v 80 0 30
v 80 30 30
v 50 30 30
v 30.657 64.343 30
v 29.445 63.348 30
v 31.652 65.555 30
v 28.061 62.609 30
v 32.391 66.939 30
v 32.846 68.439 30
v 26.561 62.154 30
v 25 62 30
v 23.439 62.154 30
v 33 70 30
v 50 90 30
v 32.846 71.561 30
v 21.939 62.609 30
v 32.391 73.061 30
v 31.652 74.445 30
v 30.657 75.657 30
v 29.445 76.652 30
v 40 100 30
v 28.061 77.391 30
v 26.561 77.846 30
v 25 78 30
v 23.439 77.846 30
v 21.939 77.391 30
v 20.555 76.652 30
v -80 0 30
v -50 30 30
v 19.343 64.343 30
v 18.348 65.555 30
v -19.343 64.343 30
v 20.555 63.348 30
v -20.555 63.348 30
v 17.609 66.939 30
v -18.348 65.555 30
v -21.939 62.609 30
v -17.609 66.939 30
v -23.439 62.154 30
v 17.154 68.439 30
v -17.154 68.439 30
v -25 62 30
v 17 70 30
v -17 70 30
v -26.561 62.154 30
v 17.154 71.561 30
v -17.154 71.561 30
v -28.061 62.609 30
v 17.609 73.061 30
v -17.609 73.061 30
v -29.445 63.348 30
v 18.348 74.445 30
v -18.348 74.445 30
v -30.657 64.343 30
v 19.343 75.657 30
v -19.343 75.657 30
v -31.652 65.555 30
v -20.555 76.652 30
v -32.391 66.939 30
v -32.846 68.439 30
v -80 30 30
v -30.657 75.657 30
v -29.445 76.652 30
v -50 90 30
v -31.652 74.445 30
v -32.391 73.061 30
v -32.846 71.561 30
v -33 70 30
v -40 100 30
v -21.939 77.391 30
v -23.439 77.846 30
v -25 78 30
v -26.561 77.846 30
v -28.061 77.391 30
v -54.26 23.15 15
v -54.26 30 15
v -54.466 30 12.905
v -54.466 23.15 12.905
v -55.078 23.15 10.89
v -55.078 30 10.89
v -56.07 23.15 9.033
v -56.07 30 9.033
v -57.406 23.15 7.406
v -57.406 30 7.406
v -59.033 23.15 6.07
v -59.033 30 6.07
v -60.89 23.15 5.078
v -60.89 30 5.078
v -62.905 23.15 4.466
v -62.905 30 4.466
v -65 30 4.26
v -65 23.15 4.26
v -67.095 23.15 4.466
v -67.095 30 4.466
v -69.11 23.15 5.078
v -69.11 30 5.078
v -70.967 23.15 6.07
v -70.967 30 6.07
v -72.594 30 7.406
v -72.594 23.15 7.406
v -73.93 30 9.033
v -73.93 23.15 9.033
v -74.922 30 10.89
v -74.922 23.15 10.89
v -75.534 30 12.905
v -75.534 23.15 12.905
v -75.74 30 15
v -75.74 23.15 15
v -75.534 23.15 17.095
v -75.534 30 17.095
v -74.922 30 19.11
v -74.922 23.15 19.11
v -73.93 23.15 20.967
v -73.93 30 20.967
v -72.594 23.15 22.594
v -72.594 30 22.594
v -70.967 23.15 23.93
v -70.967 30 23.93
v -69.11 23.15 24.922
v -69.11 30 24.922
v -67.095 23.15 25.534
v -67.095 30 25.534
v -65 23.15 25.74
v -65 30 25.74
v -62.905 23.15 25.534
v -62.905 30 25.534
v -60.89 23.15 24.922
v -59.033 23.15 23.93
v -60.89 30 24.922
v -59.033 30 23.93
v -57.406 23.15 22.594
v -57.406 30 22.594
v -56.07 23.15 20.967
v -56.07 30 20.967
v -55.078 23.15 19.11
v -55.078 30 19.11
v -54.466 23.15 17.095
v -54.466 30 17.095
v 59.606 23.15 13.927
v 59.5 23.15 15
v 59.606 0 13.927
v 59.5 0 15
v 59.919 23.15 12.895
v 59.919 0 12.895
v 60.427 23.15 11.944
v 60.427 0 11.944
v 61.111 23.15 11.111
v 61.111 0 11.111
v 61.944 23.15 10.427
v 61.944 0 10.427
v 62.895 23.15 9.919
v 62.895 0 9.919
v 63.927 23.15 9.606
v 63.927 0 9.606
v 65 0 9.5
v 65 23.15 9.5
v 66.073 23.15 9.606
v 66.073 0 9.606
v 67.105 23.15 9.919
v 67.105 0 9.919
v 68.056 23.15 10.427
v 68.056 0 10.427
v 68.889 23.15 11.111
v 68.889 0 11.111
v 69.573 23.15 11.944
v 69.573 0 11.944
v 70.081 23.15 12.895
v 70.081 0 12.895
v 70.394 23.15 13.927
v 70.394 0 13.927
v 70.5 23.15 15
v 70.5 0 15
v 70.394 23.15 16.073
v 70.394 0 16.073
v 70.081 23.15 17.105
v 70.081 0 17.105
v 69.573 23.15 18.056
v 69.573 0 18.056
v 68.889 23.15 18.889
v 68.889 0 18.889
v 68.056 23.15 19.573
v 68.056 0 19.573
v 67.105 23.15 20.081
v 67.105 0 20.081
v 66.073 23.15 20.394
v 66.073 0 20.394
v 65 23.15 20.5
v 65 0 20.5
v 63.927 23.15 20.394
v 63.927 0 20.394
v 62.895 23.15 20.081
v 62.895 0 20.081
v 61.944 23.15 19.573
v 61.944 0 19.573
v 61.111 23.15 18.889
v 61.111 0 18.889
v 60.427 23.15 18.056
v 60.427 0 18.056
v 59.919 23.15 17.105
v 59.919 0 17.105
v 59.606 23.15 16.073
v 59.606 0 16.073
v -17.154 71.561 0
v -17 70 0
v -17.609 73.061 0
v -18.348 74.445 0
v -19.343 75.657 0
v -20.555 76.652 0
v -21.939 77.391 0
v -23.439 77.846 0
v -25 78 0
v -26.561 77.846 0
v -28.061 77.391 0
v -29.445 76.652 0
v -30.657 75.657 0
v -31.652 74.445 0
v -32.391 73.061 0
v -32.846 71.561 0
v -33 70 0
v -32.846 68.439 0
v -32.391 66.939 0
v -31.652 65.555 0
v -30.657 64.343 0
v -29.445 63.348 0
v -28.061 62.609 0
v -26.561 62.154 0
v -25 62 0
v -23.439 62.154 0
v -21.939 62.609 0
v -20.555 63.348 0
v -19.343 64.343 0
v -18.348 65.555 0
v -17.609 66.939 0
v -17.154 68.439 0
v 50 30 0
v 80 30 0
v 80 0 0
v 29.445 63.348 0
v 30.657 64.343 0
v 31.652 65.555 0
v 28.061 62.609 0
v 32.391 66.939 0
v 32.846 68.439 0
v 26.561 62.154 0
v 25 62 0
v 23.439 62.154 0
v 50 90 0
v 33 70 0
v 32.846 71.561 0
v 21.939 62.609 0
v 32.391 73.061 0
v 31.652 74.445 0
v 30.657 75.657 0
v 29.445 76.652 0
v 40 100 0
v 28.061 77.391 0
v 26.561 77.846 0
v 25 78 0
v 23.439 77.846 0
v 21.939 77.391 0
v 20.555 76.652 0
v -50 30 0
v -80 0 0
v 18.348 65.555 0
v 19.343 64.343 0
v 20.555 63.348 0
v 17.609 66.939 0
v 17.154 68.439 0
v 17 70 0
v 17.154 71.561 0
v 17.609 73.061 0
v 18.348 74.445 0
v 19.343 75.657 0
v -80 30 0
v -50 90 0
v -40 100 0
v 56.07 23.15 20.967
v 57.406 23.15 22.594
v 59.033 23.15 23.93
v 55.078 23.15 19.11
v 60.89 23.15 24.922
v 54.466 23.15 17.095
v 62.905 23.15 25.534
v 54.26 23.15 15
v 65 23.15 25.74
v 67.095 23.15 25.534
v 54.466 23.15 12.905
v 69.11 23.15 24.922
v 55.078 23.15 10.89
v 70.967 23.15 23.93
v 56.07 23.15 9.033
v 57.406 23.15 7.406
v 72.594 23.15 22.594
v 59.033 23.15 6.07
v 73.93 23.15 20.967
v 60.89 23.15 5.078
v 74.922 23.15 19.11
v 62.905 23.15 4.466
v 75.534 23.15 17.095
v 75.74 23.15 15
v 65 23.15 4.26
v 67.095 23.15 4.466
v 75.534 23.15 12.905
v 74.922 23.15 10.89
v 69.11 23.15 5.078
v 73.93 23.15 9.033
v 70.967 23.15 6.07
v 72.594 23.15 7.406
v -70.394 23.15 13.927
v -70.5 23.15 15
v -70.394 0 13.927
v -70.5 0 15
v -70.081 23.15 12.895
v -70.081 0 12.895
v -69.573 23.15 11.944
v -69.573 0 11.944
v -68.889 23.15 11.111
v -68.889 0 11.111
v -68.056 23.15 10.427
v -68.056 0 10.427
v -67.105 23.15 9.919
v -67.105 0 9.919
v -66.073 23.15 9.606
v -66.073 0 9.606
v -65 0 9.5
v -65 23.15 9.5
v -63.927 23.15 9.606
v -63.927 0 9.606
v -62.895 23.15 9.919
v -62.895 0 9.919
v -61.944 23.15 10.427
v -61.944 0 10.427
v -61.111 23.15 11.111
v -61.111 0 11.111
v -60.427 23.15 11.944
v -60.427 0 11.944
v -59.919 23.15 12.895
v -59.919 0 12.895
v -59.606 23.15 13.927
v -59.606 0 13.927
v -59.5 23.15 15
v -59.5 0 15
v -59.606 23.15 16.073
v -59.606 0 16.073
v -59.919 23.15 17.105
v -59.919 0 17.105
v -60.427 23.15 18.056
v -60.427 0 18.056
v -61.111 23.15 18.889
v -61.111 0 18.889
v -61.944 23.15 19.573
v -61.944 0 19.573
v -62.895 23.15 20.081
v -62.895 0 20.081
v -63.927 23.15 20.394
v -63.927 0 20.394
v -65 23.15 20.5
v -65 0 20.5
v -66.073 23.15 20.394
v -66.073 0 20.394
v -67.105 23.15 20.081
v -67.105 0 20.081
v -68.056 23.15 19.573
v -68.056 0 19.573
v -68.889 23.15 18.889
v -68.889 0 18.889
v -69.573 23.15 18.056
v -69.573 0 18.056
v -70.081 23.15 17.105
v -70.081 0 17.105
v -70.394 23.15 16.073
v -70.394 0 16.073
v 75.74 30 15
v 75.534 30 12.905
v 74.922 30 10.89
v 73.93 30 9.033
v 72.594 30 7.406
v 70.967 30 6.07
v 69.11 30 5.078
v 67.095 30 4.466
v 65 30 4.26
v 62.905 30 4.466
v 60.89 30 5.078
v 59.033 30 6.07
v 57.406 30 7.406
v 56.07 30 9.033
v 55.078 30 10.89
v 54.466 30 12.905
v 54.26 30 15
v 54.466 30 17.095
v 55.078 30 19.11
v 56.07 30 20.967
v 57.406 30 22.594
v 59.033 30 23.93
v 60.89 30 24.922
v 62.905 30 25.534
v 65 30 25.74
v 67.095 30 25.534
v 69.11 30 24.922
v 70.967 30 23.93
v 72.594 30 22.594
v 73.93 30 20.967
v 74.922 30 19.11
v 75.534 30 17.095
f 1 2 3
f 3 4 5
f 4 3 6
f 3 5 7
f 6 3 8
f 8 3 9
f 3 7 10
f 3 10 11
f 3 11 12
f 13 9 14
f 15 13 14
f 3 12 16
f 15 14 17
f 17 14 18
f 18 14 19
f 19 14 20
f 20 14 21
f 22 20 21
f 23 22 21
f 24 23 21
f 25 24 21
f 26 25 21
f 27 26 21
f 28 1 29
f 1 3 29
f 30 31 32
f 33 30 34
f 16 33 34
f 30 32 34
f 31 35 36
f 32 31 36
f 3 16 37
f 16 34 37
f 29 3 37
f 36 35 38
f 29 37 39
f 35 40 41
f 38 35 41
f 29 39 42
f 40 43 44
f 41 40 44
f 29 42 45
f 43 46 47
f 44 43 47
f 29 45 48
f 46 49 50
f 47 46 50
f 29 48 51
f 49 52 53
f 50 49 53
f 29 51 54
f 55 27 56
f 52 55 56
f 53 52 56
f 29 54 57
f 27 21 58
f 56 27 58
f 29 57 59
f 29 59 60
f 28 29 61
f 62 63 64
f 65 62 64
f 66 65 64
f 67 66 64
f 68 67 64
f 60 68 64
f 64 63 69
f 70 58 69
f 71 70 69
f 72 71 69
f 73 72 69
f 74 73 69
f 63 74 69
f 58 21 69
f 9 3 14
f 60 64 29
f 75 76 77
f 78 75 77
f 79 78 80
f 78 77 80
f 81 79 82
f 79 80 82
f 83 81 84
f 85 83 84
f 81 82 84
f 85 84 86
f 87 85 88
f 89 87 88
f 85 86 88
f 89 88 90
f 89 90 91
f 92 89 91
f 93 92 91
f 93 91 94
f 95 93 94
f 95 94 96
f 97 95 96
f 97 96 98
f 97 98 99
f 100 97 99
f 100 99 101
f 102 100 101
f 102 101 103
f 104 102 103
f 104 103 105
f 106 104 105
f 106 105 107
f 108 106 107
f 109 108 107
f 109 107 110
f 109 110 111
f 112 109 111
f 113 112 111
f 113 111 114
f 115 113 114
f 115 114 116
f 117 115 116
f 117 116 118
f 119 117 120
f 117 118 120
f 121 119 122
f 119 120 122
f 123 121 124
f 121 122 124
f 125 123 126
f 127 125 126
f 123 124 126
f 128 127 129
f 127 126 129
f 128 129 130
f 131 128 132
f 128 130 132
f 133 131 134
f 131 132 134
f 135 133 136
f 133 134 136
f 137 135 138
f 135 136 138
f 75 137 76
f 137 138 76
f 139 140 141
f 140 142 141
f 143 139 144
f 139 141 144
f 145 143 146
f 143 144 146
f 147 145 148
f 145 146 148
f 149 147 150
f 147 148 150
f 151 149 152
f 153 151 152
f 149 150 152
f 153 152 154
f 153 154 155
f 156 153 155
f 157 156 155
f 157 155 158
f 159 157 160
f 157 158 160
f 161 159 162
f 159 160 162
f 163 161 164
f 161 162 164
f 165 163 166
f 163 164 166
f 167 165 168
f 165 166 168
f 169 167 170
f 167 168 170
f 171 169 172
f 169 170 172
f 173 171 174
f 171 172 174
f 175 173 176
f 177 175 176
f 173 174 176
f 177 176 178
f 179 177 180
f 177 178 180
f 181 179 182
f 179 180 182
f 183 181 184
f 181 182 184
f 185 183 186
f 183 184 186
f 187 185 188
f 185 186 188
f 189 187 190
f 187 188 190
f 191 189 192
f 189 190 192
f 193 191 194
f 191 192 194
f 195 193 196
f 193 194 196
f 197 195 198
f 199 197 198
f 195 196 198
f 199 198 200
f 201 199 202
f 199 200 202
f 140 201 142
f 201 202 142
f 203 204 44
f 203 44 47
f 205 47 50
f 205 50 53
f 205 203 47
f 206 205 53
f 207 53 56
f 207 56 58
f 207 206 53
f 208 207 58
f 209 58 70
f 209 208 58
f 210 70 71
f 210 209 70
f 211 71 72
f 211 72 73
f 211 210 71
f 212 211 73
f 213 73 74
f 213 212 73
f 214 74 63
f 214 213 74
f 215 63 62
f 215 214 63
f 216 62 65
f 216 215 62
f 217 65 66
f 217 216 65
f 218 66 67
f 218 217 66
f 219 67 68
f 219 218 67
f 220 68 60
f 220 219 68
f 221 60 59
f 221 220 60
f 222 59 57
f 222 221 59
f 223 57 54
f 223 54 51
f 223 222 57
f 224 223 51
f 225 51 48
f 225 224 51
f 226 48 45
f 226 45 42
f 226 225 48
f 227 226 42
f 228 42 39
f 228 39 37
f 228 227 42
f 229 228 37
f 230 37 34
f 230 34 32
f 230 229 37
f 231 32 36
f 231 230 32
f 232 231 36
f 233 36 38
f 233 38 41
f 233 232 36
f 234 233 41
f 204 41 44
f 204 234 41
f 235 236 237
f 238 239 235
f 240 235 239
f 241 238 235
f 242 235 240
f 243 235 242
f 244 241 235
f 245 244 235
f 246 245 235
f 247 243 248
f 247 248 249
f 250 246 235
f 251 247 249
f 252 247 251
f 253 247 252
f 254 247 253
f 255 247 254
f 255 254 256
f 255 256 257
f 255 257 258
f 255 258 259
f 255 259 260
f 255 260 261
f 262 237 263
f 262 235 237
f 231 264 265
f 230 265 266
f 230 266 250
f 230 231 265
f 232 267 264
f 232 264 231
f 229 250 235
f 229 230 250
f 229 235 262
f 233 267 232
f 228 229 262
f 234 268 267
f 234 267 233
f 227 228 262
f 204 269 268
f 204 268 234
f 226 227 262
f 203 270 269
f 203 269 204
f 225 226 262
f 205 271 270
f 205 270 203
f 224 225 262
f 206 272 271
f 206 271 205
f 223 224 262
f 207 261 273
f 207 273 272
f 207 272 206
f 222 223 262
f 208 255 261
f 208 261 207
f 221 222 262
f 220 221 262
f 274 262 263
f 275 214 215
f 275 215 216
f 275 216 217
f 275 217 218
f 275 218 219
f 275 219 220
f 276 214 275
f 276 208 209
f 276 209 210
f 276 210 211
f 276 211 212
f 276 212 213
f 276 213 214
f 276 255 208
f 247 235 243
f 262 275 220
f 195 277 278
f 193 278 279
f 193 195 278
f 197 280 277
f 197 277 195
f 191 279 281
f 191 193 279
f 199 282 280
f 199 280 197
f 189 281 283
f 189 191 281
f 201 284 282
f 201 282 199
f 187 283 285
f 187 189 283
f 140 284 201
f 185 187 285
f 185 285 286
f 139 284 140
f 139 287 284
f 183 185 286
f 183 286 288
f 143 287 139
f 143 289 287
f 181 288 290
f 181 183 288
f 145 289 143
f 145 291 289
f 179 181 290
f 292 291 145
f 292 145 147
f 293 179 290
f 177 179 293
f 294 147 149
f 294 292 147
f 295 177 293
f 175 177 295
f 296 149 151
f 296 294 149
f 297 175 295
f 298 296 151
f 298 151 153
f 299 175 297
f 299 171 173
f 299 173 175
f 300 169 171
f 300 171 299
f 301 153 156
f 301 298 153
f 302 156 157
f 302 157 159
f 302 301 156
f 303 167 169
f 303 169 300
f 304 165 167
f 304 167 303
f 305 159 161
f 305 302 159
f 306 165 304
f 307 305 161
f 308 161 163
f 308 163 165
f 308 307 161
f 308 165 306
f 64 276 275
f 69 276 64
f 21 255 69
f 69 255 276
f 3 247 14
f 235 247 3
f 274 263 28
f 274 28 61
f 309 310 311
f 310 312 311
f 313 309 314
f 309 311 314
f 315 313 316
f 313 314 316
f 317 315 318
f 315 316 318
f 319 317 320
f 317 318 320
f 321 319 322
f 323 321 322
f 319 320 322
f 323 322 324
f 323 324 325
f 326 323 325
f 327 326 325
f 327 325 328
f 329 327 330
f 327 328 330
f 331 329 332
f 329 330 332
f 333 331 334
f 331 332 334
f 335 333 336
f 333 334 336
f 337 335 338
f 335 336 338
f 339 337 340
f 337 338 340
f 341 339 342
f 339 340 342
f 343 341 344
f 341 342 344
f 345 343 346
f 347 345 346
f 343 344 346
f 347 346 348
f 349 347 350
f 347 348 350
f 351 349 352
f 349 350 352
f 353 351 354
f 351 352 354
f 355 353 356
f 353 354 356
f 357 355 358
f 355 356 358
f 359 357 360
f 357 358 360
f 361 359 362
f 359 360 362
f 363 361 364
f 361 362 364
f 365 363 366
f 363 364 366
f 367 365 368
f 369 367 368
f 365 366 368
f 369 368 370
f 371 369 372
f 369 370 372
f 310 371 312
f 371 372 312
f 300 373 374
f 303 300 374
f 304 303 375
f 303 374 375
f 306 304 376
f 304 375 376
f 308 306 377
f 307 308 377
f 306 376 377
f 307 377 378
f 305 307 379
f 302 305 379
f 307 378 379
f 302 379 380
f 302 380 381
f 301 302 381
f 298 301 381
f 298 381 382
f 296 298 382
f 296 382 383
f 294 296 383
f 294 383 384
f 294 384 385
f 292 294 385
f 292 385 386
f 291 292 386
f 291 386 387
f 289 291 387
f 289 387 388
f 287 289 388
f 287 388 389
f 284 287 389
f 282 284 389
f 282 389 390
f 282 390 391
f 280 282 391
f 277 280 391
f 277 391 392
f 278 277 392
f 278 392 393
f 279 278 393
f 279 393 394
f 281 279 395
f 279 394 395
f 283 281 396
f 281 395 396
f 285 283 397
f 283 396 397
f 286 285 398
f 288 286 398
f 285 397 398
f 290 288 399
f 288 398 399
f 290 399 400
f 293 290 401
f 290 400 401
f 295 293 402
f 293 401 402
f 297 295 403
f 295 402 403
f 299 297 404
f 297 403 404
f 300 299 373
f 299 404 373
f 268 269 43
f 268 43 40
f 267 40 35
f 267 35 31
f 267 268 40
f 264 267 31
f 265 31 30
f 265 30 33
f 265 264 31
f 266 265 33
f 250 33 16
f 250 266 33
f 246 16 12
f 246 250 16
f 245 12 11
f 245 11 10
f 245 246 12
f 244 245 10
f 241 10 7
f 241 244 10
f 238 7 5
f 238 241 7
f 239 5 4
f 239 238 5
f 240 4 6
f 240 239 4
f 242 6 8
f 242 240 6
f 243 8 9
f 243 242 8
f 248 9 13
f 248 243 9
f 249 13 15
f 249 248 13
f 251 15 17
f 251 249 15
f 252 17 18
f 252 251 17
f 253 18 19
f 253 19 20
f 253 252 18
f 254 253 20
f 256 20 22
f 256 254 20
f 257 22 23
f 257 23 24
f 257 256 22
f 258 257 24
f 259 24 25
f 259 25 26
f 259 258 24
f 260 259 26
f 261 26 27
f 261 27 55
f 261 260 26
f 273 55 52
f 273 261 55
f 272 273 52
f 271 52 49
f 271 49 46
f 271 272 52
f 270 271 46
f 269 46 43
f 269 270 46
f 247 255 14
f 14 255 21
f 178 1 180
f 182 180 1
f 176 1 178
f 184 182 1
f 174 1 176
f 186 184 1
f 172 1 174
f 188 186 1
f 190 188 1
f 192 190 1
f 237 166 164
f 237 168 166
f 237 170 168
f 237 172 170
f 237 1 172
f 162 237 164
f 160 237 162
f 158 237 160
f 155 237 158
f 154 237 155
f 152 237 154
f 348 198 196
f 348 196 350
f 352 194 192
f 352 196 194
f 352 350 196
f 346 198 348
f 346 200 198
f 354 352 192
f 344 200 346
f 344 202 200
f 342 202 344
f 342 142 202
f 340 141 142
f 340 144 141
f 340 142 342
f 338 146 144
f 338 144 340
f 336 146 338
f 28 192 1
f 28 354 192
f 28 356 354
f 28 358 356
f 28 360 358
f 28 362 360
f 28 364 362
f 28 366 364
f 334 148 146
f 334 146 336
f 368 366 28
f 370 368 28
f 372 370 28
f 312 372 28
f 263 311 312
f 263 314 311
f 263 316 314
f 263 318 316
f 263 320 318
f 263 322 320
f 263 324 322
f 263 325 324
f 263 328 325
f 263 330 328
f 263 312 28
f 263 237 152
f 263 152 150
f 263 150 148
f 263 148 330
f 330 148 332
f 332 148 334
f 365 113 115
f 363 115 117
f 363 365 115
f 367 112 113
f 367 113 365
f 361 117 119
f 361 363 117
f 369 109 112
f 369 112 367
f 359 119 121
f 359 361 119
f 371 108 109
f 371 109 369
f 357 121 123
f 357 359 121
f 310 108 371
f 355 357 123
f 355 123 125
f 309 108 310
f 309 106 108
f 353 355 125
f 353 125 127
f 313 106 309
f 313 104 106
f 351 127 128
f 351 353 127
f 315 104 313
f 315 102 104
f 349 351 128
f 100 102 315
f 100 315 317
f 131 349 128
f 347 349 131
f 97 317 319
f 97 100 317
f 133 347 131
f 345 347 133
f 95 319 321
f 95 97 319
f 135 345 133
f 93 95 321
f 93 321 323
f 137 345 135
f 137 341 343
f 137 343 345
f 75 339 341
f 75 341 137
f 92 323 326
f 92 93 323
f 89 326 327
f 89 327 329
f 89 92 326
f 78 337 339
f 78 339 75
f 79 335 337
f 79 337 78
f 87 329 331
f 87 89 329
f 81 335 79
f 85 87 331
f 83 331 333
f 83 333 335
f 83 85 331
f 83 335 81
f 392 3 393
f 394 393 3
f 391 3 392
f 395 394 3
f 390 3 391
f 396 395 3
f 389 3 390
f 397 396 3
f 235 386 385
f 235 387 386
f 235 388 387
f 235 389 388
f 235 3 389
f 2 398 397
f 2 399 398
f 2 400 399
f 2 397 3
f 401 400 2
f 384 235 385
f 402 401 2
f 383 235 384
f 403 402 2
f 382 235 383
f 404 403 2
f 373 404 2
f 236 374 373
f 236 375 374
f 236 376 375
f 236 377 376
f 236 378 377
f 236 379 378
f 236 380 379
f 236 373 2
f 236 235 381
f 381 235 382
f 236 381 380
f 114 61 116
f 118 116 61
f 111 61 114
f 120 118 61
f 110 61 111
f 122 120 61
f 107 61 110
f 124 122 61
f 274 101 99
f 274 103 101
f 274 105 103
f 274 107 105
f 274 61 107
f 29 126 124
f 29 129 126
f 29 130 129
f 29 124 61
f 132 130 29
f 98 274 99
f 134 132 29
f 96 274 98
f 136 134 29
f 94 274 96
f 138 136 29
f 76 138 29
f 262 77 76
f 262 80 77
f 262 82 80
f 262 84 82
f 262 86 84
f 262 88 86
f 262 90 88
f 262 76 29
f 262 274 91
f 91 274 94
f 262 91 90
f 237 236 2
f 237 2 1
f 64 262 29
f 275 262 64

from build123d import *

# Parameters (mm, degrees)
SKETCH2_R                        = 8
CORPO_FUROS_20MM_DEPTH           = 30
CHANFROS_10X45_SIZE              = 10
REBAIXO_PARAFUSO_M10_D           = 11
REBAIXO_PARAFUSO_M10_CBORE_D     = 21.48
REBAIXO_PARAFUSO_M10_CBORE_DEPTH = 6.85


with BuildPart() as part:
    # Sketch2 → Corpo - Furos 20mm (new body)
    with BuildSketch(Plane.XY):
        Polygon((80, 0), (-80, 0), (-80, 30), (-50, 30), (-50, 100), (0, 100), (50, 100), (50, 30), (80, 30), align=None)
        with Locations((-25, 70)):
            Circle(SKETCH2_R, mode=Mode.SUBTRACT)
        with Locations(Location((25, 70, 0), (0, 0, 180))):
            Circle(SKETCH2_R, mode=Mode.SUBTRACT)
    extrude(amount=CORPO_FUROS_20MM_DEPTH)

    # Chanfros 10x45°
    chanfros_10x45_edges = [part.edges().sort_by_distance(p)[0] for p in [
        (50, 100, 15),
        (-50, 100, 15),
    ]]
    chamfer(chanfros_10x45_edges, length=CHANFROS_10X45_SIZE)

    # Rebaixo Parafuso M10 (through all)
    with Locations(Plane(origin=(0, 30, 0), x_dir=(1, 0, 0), z_dir=(0, 1, 0))):
        with Locations((-65, -15), (65, -15)):
            CounterBoreHole(REBAIXO_PARAFUSO_M10_D / 2, REBAIXO_PARAFUSO_M10_CBORE_D / 2, REBAIXO_PARAFUSO_M10_CBORE_DEPTH)


solid = part.part
